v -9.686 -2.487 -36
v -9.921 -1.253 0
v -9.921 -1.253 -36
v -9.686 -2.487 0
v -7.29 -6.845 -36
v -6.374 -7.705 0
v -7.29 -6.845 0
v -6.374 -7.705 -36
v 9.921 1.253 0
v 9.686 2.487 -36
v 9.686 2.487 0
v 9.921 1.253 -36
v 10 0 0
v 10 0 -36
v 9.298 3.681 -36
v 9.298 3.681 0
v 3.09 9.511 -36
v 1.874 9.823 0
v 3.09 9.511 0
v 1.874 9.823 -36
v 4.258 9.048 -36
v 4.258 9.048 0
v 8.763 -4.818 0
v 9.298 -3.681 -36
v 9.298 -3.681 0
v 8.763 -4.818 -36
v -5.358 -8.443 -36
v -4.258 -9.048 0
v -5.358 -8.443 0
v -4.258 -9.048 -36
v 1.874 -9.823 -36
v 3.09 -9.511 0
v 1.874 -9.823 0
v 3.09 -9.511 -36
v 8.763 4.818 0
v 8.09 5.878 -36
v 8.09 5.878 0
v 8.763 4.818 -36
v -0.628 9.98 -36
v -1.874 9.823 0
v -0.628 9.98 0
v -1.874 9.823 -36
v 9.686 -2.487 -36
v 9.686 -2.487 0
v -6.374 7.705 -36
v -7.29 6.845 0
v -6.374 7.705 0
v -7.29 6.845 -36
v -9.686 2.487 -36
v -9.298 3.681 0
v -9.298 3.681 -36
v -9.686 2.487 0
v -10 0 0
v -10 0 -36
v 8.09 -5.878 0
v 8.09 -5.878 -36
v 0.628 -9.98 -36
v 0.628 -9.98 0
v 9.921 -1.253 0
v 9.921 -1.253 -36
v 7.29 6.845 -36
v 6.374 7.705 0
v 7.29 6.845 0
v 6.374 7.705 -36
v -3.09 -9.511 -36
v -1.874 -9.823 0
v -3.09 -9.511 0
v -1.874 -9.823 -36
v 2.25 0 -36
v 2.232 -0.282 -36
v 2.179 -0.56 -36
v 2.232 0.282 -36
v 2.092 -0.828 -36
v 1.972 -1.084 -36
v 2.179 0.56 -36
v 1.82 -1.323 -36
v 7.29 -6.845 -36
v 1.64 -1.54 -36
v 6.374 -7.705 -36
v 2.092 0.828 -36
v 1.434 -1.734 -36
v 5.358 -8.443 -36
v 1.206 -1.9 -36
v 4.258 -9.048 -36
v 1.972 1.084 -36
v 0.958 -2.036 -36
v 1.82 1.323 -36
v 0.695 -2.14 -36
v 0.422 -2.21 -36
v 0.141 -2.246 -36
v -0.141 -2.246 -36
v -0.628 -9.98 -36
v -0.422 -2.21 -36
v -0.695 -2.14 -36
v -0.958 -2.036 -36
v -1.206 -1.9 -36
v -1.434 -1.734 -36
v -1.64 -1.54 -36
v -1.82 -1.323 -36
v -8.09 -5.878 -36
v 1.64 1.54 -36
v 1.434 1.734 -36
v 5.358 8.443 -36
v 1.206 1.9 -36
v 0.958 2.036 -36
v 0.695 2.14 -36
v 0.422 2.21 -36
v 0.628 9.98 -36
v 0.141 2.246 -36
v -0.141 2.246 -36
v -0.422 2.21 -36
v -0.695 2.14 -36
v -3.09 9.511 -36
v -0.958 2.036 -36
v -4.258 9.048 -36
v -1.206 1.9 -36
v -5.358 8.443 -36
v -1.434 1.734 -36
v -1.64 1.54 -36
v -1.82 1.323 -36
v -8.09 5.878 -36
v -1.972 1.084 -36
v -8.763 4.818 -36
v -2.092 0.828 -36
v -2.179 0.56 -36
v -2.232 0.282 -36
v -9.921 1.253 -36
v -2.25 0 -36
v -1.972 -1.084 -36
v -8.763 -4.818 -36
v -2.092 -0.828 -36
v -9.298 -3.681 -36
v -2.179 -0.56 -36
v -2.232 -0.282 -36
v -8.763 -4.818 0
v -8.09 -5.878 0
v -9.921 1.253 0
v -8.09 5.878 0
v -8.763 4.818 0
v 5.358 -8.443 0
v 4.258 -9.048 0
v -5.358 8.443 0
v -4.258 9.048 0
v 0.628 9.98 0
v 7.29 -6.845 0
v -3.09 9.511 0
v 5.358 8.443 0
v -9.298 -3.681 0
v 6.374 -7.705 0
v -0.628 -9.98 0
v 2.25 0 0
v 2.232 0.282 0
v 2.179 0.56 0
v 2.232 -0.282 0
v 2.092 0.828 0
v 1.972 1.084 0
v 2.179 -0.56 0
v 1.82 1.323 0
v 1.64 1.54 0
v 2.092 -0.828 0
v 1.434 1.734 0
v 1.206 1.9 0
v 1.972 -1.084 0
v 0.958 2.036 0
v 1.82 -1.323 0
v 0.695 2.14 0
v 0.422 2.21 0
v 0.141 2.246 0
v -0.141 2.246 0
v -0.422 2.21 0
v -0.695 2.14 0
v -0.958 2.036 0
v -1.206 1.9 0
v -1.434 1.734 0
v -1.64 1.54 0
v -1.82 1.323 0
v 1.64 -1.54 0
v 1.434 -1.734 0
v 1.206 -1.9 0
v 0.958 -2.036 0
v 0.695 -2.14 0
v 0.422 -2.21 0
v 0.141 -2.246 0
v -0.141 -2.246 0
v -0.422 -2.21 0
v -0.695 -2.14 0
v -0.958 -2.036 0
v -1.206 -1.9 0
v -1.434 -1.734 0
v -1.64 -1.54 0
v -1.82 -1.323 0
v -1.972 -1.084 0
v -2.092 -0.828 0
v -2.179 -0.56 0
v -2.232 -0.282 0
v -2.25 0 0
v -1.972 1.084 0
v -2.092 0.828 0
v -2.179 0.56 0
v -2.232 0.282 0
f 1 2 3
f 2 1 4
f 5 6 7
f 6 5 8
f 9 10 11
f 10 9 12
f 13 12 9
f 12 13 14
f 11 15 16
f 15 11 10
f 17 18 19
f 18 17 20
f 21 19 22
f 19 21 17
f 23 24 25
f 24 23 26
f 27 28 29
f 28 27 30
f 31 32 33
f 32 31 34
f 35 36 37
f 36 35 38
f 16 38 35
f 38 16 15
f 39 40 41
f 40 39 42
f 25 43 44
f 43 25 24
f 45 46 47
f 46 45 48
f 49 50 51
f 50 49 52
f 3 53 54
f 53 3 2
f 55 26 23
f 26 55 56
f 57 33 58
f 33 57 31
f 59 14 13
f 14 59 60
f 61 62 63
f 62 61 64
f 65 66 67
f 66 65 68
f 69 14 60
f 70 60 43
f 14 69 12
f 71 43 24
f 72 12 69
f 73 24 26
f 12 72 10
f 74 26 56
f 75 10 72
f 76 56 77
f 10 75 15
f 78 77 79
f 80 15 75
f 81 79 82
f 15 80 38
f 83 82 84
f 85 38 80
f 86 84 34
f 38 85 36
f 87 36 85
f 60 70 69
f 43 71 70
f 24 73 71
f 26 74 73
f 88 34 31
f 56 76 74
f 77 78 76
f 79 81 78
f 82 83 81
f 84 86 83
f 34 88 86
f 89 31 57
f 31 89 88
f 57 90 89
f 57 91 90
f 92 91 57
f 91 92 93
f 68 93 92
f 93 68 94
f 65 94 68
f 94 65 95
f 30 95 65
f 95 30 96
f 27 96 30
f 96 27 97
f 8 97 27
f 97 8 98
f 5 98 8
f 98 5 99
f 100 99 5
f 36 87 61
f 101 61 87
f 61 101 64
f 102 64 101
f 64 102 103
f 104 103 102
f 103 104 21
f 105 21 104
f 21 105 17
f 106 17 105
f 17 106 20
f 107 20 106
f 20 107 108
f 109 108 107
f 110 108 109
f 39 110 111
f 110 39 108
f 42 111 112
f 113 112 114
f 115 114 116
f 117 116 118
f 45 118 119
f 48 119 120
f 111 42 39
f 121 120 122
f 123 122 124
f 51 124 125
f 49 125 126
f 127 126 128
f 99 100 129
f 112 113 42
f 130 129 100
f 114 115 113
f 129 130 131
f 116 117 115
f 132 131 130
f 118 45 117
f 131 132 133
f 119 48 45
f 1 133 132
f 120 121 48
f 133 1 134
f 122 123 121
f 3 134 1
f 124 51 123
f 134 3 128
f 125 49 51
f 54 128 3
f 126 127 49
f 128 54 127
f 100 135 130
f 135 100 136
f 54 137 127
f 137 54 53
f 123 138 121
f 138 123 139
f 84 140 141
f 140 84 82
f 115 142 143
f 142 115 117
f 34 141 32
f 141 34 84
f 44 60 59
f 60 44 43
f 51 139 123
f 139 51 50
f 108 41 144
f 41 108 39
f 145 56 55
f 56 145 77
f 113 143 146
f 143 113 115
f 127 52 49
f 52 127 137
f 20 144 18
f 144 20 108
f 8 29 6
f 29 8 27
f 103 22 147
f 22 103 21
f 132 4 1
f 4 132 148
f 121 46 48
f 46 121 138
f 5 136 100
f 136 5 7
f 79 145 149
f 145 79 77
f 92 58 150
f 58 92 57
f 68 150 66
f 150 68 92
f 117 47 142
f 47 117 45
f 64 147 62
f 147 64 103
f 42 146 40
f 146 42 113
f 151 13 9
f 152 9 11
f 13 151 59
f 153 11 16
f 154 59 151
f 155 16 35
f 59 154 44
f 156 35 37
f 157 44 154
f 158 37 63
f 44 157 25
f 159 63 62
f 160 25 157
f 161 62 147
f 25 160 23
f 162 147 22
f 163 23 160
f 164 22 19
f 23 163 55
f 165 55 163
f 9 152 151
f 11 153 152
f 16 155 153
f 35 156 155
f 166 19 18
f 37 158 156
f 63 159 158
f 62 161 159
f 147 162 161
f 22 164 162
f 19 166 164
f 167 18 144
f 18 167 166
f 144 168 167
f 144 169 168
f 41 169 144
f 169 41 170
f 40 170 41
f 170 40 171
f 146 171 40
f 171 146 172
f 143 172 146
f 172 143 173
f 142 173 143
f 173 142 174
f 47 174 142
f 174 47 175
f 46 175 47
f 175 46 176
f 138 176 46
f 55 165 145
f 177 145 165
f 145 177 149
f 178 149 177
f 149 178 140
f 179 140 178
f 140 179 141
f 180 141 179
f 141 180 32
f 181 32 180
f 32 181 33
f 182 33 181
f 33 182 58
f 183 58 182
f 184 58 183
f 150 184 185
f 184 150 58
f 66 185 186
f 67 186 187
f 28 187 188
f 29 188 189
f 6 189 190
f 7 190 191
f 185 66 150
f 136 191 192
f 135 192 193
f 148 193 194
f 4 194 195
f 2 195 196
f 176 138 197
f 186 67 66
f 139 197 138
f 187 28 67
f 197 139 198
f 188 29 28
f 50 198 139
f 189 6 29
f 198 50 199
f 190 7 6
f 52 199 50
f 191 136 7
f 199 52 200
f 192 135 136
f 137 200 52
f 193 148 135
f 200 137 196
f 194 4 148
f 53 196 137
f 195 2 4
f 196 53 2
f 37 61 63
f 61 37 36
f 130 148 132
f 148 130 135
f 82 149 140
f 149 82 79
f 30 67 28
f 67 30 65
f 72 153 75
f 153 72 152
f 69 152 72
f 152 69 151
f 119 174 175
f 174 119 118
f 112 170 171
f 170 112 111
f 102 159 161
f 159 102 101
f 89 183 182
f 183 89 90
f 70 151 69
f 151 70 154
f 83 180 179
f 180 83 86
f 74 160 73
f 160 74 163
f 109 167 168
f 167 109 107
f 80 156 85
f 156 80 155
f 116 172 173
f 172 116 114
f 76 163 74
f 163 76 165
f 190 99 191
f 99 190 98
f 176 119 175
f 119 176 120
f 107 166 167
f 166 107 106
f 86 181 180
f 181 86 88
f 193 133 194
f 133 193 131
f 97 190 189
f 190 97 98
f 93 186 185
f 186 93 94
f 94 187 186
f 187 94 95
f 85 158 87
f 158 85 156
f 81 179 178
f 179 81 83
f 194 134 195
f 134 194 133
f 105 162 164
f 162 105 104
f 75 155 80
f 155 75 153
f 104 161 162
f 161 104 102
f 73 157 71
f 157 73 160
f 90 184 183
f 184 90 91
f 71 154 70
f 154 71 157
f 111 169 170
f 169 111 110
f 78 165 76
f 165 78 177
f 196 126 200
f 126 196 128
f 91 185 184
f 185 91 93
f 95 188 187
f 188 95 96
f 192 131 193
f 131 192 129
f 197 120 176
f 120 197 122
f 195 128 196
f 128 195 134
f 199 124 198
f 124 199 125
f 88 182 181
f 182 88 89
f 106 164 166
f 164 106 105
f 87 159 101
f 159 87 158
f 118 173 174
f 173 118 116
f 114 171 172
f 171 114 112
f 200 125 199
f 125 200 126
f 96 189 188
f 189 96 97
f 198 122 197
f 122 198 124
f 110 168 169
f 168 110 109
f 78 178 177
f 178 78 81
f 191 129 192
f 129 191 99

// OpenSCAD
$fn = 50;


difference() {
	union() {
		translate(v = [0, 0, -36.0000000000]) {
			cylinder(h = 36, r = 10.0000000000);
		}
		cylinder(h = 0, r = 19.0000000000);
	}
	union() {
		#translate(v = [0, 0, -36]) {
			cylinder(h = 36, r = 2.2500000000);
		}
	}
}
